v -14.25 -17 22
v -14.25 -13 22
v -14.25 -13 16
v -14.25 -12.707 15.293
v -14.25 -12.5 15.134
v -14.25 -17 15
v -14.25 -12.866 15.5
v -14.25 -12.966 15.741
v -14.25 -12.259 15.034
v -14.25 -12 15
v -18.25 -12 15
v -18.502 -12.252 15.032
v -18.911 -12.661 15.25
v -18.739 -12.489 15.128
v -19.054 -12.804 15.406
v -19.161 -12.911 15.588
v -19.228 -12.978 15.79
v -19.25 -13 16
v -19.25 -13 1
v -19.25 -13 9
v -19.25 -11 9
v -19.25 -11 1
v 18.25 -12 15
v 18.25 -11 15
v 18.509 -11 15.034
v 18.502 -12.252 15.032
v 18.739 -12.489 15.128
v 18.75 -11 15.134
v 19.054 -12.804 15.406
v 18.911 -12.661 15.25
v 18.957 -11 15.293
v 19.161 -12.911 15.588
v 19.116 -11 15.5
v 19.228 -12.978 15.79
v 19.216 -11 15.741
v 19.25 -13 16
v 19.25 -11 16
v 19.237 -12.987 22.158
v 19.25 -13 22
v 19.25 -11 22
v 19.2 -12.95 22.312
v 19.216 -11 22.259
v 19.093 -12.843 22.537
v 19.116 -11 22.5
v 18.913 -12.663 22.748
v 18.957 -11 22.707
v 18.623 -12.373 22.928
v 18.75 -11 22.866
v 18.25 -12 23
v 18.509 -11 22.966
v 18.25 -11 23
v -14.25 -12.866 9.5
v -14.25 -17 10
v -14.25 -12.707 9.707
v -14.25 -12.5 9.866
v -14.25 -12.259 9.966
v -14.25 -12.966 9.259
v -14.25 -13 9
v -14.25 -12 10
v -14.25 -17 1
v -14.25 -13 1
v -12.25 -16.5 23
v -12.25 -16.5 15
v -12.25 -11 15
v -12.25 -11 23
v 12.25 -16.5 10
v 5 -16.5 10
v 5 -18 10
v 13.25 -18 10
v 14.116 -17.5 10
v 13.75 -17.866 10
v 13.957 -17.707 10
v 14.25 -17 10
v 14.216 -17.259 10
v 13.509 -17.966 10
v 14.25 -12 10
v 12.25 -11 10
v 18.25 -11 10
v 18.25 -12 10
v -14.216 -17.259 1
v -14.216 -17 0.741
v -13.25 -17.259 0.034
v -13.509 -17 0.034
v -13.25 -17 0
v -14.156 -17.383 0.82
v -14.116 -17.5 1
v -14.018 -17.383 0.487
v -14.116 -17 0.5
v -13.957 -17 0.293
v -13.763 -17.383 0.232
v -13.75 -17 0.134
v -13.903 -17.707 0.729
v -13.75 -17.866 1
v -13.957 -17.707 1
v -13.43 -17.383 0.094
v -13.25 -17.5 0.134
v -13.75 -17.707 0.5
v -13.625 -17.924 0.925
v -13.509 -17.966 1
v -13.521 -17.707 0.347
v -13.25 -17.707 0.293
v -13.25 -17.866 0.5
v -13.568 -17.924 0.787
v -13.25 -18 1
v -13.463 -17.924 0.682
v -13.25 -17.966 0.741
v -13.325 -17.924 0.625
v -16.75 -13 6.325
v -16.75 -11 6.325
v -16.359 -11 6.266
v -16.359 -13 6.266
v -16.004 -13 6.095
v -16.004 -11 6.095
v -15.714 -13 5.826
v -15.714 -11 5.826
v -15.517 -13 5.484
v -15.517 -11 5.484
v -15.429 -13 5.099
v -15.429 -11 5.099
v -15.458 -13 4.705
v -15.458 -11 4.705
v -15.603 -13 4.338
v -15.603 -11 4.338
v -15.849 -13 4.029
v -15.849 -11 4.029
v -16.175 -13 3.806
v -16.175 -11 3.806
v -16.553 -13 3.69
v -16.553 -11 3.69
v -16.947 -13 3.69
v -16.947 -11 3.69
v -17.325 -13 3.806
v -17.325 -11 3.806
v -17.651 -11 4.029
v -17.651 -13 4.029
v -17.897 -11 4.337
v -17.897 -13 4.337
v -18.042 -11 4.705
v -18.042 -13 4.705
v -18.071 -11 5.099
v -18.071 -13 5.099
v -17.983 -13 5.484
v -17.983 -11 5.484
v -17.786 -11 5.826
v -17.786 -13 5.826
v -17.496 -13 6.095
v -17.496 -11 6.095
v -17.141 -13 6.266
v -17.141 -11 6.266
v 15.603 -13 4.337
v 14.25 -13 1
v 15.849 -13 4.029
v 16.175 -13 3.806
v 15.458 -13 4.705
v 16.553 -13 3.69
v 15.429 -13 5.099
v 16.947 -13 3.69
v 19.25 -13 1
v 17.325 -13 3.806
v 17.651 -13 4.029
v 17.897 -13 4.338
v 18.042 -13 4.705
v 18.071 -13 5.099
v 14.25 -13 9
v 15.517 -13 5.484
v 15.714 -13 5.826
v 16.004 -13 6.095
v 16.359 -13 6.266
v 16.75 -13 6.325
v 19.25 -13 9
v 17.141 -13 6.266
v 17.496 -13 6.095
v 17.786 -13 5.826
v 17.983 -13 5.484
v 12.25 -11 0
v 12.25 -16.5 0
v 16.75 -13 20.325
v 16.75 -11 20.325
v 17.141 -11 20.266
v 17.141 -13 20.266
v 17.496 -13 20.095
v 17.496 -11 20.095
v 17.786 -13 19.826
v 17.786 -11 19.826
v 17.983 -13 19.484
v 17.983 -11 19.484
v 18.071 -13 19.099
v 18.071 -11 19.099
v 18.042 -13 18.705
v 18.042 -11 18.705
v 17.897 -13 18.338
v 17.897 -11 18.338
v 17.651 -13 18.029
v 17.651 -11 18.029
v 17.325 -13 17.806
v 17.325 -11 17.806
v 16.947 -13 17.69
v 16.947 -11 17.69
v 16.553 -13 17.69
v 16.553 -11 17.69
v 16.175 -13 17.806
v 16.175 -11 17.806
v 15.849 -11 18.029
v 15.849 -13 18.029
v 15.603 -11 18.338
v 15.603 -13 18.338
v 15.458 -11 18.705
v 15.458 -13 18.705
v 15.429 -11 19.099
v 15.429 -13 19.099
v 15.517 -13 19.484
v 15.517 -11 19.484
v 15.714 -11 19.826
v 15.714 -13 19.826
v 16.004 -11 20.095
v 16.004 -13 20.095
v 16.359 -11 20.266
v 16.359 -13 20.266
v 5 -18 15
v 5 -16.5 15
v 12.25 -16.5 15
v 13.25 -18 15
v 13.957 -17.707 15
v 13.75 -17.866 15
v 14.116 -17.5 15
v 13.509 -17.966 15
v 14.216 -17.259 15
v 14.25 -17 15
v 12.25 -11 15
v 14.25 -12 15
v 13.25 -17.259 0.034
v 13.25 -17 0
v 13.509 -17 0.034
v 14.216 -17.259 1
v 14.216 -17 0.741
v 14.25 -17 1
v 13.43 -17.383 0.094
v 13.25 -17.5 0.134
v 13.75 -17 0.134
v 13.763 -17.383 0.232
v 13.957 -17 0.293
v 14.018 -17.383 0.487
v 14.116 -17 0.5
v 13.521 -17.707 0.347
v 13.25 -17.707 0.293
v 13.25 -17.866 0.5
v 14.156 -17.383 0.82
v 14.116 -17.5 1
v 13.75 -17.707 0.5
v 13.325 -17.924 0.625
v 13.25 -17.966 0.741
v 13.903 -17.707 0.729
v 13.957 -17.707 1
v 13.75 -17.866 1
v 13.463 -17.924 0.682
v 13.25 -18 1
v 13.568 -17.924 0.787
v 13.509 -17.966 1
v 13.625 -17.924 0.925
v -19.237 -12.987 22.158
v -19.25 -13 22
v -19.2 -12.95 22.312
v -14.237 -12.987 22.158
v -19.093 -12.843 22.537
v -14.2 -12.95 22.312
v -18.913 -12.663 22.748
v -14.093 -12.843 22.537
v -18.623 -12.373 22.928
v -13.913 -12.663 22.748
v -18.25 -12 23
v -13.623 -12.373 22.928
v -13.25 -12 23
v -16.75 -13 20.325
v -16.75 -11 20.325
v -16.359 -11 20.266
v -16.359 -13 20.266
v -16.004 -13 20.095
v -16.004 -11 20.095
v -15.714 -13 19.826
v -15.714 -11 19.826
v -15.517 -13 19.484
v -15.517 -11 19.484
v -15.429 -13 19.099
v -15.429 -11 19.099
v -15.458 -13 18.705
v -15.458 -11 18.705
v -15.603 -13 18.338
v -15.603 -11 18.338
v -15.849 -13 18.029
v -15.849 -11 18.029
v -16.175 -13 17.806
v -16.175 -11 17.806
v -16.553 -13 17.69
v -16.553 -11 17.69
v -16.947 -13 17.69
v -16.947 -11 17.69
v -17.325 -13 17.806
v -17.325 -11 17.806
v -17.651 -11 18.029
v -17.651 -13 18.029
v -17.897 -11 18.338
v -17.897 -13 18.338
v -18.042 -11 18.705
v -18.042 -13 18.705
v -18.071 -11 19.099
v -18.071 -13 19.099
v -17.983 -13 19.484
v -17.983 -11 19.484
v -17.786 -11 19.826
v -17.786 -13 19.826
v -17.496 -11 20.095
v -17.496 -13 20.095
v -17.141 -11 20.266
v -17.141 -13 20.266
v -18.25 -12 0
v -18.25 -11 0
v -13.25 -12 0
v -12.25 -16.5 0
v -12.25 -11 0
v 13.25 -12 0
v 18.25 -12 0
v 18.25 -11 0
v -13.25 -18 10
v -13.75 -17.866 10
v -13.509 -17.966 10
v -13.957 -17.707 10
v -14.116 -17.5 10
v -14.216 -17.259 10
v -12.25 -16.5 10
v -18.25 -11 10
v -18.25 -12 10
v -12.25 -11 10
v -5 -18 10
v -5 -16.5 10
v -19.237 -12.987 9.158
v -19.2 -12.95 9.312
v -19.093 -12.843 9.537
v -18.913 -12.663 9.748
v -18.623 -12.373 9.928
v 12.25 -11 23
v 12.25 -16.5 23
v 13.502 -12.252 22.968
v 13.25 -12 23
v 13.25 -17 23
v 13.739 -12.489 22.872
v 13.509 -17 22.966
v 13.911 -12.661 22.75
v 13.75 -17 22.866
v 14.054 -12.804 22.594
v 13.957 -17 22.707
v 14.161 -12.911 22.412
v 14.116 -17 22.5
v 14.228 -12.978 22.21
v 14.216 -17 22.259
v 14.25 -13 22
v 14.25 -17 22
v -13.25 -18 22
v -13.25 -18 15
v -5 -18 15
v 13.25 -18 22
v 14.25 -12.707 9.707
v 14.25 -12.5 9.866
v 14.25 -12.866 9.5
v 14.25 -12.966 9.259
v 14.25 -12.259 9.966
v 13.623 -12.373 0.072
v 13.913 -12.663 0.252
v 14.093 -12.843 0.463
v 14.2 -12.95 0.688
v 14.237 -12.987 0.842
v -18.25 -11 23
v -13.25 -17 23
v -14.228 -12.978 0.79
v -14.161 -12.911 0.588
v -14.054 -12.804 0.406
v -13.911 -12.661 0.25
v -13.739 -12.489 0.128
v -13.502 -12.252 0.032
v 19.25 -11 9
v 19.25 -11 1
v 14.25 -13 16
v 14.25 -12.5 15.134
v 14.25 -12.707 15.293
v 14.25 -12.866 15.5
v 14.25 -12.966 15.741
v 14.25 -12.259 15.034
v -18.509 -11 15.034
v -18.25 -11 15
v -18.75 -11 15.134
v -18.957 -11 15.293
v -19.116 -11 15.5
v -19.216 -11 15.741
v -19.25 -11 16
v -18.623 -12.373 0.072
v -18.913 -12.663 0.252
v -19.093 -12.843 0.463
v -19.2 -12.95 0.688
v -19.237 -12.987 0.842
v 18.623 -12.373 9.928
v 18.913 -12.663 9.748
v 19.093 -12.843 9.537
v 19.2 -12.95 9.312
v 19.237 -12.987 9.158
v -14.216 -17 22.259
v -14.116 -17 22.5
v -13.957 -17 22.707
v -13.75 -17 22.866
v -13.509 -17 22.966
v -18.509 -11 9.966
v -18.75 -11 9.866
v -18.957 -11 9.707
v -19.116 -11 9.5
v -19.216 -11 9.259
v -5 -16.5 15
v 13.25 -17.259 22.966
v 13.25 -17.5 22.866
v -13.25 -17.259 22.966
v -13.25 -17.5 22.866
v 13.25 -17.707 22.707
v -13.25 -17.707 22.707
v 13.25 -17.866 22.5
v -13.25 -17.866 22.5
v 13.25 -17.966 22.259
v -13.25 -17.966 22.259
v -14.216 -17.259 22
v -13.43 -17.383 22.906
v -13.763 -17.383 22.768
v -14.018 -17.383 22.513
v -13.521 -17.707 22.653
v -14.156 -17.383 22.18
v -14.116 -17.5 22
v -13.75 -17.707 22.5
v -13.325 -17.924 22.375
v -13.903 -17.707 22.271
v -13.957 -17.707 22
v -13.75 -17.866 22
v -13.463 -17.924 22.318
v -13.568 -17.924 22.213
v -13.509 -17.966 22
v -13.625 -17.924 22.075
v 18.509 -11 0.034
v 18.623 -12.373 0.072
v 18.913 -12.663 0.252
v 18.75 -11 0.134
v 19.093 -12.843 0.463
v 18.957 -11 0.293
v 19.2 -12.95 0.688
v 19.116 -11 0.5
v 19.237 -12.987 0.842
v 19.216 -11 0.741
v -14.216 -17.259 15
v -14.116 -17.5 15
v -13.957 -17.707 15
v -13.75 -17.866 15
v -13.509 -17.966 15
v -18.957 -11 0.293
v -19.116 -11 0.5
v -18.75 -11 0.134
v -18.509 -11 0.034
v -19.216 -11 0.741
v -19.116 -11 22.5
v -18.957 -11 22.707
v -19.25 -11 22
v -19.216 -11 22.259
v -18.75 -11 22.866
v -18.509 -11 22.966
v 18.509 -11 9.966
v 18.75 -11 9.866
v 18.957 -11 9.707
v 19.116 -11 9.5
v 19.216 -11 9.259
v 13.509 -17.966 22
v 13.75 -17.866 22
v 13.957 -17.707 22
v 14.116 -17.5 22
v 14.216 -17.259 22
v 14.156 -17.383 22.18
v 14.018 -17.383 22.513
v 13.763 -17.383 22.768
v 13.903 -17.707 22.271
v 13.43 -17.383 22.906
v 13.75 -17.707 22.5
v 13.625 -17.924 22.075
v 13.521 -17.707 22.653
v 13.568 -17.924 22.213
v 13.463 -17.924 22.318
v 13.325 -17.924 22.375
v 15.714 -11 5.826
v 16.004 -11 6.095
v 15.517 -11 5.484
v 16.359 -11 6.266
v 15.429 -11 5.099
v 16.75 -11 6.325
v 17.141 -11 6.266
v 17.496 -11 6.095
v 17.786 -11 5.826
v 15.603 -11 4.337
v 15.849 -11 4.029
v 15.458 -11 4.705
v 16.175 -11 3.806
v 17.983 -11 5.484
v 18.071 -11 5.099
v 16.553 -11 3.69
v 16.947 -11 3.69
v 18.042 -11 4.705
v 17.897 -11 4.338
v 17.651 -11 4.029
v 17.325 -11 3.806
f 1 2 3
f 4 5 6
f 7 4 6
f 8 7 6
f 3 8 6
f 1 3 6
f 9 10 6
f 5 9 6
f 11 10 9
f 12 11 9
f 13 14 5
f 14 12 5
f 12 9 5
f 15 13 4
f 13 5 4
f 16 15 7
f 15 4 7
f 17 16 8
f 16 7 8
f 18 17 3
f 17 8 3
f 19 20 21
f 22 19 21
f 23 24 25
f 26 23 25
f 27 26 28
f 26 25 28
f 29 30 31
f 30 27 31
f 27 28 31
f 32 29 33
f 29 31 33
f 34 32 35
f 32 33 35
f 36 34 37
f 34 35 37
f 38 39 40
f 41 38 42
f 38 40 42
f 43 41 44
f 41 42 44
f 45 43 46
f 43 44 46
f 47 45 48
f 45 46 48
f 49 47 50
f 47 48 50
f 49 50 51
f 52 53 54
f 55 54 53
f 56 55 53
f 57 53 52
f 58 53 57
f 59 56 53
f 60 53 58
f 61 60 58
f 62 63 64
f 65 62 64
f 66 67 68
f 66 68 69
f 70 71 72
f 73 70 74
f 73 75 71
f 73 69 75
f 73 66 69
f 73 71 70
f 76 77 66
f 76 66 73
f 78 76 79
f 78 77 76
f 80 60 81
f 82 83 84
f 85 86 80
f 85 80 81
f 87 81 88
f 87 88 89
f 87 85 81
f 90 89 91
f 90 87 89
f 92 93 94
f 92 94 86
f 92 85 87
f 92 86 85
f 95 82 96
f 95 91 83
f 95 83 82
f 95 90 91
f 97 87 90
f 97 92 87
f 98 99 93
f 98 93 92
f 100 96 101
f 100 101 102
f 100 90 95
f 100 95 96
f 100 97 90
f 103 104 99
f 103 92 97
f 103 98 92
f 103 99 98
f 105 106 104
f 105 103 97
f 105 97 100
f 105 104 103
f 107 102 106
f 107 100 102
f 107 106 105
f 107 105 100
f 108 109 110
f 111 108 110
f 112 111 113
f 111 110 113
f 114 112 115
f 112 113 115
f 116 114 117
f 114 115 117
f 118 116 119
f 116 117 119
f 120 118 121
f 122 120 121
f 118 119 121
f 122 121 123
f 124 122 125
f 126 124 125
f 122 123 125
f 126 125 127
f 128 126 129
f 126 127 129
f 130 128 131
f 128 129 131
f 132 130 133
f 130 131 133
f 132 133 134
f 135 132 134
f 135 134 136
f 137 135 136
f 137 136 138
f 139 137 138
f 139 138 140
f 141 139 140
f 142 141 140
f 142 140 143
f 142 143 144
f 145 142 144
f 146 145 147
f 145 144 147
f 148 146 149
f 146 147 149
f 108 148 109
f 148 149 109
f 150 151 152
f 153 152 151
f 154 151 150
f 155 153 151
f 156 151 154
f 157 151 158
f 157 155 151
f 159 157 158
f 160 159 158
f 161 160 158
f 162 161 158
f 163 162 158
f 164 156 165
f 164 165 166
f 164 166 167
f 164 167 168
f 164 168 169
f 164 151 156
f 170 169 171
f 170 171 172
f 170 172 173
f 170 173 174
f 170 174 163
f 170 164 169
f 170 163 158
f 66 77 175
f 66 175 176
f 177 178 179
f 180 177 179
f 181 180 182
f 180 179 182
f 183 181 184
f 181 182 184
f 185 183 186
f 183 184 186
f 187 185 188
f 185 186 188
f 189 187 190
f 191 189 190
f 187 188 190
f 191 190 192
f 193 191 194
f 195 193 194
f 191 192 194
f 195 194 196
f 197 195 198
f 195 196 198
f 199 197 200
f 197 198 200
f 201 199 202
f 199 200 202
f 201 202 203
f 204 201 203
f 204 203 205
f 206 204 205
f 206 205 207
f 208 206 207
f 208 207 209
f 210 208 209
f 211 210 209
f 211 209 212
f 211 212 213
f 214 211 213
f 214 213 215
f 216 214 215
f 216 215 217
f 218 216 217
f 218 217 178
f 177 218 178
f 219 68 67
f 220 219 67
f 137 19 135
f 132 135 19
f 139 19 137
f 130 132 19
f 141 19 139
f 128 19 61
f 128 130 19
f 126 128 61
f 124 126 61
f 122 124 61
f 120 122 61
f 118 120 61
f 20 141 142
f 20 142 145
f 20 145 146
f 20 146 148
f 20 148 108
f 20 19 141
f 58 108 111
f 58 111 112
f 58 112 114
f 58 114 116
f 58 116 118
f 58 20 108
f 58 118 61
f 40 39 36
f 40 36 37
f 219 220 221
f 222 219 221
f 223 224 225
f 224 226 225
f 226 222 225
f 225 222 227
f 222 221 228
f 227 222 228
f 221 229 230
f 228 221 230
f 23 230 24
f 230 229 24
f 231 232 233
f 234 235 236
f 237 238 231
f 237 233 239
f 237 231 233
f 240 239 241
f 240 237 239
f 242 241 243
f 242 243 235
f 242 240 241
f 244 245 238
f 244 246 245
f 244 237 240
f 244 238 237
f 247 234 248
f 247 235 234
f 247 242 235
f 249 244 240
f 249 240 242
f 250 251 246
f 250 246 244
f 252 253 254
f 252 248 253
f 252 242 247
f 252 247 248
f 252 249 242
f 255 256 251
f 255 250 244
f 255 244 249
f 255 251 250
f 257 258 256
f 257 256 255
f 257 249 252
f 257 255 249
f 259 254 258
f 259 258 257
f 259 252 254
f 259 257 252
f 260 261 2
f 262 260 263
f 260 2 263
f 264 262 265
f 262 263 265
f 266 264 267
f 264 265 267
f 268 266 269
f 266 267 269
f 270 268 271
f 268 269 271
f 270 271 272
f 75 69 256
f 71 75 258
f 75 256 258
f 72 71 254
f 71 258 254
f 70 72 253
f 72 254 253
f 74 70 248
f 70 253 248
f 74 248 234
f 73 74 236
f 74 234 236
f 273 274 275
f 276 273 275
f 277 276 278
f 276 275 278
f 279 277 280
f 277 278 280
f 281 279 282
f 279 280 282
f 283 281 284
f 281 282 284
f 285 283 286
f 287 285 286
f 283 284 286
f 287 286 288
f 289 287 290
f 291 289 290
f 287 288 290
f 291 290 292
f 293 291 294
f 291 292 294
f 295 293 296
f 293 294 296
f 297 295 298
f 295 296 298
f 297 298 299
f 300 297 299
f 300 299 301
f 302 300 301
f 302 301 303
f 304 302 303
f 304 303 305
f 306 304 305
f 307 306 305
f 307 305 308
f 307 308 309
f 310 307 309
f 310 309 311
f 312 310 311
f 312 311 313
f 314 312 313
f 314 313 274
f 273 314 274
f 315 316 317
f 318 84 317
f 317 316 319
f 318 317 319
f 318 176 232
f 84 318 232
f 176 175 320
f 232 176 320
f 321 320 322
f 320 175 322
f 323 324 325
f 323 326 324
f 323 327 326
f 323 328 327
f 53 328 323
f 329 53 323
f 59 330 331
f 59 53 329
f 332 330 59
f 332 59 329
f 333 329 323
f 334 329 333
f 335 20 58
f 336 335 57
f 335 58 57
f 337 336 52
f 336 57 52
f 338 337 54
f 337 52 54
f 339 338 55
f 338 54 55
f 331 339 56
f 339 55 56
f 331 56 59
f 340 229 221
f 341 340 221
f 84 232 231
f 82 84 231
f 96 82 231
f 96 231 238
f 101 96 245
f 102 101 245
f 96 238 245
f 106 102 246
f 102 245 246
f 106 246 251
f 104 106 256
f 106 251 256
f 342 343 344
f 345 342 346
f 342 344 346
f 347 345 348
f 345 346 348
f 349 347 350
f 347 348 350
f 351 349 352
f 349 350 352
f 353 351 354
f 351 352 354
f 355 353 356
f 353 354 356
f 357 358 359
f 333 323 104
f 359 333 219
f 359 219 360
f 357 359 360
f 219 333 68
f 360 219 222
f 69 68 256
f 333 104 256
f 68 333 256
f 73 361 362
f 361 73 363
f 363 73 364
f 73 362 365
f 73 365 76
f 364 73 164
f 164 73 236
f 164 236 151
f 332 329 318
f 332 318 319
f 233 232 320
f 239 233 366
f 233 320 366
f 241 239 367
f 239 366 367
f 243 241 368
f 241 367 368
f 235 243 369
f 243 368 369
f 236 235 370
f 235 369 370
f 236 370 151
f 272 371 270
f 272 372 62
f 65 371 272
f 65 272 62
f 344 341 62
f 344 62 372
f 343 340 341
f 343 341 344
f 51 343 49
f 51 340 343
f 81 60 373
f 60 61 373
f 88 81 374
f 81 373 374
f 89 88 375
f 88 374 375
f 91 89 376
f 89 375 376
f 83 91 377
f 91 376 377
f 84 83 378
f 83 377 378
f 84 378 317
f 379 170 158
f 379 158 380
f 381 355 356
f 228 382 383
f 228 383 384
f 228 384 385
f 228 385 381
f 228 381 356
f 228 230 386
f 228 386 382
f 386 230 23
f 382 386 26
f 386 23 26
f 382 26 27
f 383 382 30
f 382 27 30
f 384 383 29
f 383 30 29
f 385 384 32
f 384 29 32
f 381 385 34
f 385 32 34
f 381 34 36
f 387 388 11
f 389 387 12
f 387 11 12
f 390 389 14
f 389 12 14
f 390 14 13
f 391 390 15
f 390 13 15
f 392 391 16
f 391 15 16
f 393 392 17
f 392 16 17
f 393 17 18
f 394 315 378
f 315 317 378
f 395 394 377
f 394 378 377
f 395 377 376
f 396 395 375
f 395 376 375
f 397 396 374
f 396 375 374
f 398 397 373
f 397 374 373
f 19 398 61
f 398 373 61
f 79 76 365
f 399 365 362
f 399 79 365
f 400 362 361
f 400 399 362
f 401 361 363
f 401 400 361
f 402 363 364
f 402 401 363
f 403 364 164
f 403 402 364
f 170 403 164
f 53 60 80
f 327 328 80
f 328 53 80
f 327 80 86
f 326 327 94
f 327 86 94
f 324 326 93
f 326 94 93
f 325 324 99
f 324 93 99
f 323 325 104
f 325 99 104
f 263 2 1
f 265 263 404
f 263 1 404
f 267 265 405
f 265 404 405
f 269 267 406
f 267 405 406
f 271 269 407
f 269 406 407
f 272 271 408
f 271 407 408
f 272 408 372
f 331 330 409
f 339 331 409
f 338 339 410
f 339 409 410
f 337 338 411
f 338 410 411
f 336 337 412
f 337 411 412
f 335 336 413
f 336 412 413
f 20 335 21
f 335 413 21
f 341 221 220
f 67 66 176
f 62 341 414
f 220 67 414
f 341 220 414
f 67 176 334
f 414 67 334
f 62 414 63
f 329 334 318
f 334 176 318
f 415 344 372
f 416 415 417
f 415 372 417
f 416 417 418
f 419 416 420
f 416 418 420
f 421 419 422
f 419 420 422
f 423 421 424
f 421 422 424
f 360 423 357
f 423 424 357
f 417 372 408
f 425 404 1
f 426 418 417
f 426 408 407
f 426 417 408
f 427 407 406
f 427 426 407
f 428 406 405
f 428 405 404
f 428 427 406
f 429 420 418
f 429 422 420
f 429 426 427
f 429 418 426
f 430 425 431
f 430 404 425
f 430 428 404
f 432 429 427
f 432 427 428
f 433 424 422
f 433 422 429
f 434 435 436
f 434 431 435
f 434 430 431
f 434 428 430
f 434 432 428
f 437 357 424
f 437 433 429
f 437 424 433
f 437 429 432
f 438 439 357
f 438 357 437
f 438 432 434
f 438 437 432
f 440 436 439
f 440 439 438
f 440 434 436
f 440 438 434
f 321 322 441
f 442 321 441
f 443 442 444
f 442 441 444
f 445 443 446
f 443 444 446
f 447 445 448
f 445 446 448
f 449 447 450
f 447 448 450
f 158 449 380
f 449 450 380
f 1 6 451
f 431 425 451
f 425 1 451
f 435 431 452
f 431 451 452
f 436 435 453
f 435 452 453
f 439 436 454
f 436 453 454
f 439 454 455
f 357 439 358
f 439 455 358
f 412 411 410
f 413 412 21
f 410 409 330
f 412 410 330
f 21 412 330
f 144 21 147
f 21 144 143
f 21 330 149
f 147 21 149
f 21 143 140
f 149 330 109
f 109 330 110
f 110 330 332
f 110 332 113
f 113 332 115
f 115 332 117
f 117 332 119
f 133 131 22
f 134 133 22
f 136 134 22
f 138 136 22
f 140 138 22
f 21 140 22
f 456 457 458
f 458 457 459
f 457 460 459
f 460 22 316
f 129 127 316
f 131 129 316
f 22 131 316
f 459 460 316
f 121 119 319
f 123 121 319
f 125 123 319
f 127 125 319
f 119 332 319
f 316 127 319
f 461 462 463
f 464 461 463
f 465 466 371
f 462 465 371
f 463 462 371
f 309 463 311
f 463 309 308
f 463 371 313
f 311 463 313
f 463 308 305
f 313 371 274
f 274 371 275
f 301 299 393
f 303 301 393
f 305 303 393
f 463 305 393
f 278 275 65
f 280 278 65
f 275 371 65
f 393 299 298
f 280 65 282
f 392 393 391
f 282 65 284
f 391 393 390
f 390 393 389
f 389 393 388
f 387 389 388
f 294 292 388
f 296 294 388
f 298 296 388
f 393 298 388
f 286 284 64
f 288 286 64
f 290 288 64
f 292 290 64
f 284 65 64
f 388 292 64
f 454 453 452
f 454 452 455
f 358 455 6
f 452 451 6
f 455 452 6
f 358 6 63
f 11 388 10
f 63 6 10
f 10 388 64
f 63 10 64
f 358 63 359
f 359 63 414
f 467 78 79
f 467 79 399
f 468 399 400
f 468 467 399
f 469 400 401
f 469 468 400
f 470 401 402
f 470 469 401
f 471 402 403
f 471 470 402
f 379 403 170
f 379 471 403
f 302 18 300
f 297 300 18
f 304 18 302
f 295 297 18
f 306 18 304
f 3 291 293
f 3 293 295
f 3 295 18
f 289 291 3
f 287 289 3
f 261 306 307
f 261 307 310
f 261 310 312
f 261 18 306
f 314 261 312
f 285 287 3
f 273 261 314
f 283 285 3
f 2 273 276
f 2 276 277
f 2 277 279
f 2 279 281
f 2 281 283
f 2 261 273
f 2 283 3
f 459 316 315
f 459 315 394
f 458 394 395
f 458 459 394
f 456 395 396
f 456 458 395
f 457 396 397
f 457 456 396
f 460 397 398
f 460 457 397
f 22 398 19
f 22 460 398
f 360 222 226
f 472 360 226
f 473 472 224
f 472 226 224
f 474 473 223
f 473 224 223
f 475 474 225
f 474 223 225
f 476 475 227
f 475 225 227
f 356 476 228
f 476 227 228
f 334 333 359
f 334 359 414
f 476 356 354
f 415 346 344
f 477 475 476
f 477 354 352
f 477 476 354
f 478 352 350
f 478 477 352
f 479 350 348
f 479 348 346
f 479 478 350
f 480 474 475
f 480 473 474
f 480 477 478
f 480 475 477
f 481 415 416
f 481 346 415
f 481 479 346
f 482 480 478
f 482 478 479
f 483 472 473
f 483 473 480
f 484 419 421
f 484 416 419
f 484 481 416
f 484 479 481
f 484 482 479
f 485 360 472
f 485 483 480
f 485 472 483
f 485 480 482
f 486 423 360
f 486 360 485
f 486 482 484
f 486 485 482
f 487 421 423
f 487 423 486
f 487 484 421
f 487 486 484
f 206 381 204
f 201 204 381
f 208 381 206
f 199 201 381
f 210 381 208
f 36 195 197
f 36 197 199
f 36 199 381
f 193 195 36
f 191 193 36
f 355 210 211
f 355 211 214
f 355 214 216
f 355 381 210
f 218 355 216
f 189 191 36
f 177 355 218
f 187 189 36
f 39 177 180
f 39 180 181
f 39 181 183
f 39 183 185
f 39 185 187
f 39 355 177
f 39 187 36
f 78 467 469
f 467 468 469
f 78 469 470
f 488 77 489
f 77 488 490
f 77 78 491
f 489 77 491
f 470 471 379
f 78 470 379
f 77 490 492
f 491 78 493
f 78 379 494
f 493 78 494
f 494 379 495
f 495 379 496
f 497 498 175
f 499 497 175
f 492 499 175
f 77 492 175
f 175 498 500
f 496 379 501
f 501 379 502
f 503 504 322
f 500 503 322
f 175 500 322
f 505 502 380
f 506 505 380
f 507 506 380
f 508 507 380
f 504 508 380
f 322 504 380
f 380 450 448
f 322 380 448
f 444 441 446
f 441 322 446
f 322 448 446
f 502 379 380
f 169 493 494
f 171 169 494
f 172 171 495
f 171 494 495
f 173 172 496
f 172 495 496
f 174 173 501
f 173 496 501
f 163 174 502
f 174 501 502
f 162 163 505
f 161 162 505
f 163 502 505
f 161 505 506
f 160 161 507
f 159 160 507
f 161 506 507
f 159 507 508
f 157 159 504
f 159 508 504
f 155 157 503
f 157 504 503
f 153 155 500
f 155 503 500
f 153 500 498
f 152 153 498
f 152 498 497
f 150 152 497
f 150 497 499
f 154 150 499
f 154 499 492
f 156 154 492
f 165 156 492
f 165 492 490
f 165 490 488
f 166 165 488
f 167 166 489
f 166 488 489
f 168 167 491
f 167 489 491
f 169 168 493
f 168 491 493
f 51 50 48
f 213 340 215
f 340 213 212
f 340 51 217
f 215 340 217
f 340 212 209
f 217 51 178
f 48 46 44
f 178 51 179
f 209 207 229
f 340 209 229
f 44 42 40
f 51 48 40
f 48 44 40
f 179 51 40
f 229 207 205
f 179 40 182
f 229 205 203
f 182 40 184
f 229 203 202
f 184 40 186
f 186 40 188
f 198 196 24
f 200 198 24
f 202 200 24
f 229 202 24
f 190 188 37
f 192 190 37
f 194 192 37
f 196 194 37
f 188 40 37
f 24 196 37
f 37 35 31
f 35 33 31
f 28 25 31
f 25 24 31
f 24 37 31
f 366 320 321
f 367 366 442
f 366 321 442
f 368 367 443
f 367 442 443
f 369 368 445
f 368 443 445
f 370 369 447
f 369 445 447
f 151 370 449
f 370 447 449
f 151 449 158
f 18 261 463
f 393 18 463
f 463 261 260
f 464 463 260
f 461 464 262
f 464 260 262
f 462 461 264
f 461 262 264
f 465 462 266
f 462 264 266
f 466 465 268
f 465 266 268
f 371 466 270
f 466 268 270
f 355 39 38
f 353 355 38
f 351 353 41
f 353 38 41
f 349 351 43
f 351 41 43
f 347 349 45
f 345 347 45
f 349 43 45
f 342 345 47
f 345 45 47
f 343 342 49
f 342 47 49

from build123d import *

# Parameters (mm, degrees)
SKETCH1_W           = 28.5
SKETCH1_H           = 36
SKETCH1_W_2         = 24.5
SKETCH1_H_2         = 33
BOSS_EXTRUDE1_DEPTH = 10
SKETCH2_W           = 5
SKETCH2_H           = 4
BOSS_EXTRUDE2_DEPTH = 10
SKETCH3_R           = 1.325
CUT_EXTRUDE1_DEPTH  = 10
FILLET1_R           = 1
FILLET2_R           = 1
CUT_EXTRUDE2_DEPTH  = 40.322385482
SKETCH5_W           = 15
SKETCH5_H           = 1.5
SKETCH5_W_2         = 2
SKETCH5_H_2         = 10
BOSS_EXTRUDE3_DEPTH = 5
SKETCH6_W           = 10
SKETCH6_H           = 1.5
BOSS_EXTRUDE4_DEPTH = 5
BOSS_EXTRUDE5_DEPTH = 8
SKETCH8_W           = 7
SKETCH8_H           = 3
CUT_EXTRUDE3_DEPTH  = 5
SKETCH9_W           = 5
SKETCH9_H           = 2.1
CUT_EXTRUDE4_DEPTH  = 5
SKETCH10_W          = 10
SKETCH10_H          = 1.5
BOSS_EXTRUDE6_DEPTH = 8
SKETCH11_W          = 5
SKETCH11_H          = 4
BOSS_EXTRUDE7_DEPTH = 8
SKETCH12_R          = 1.325
CUT_EXTRUDE5_DEPTH  = 42.37405588
CUT_EXTRUDE6_DEPTH  = 46.072164359
FILLET3_R           = 1


with BuildPart() as part:
    # Sketch1 → Boss-Extrude1 (new body)
    with BuildSketch(Plane.XY):
        Rectangle(SKETCH1_W, SKETCH1_H)
        Rectangle(SKETCH1_W_2, SKETCH1_H_2, mode=Mode.SUBTRACT)
    extrude(amount=BOSS_EXTRUDE1_DEPTH)

    # Sketch2 → Boss-Extrude2 (add)
    with BuildSketch(Plane.XY.offset(10)):
        with Locations((-16.75, -11)):
            Rectangle(SKETCH2_W, SKETCH2_H)
        with Locations((16.75, -11)):
            Rectangle(SKETCH2_W, SKETCH2_H)
    extrude(amount=-BOSS_EXTRUDE2_DEPTH)

    # Sketch3 → Cut-Extrude1 (cut)
    with BuildSketch(Plane(origin=(0, -9, 0), x_dir=(1, 0, 0), z_dir=(0, 1, 0))):
        with Locations(Location((-16.75, -5, 0), (0, 0, 270))):
            Circle(SKETCH3_R)
        with Locations(Location((16.75, -5, 0), (0, 0, 270))):
            Circle(SKETCH3_R)
    extrude(amount=-CUT_EXTRUDE1_DEPTH, mode=Mode.SUBTRACT)


with BuildPart() as body_2:
    # Split1: the piece on the far side of the plane
    add(part.part)
    split(bisect_by=Plane(origin=(0, -11, 0), x_dir=(0, 0, -1), z_dir=(0, -1, 0)), keep=Keep.BOTTOM)

    # Fillet1
    fillet1_edges = [body_2.edges().sort_by_distance(p)[0] for p in [
        (-16.75, -9, 10),
        (-19.25, -10, 10),
        (-19.25, -10, 0),
        (-16.75, -9, 0),
        (14.25, 4.5, 0),
        (0, 18, 0),
        (-14.25, 4.5, 0),
        (16.75, -9, 0),
        (19.25, -10, 10),
        (19.25, -10, 0),
        (16.75, -9, 10),
    ]]
    fillet(fillet1_edges, radius=FILLET1_R)

    # Sketch4 → Cut-Extrude2 (cut, through all)
    with BuildSketch(Plane.ZY.offset(14.25)):
        with BuildLine():
            Line((7, 12.5), (7, -3.5))
            ThreePointArc((7, -3.5), (5, -5.5), (3, -3.5))
            Line((3, -3.5), (3, 12.5))
            ThreePointArc((3, 12.5), (5, 14.5), (7, 12.5))
        make_face()
    extrude(amount=-CUT_EXTRUDE2_DEPTH, mode=Mode.SUBTRACT)

    # Sketch5 → Boss-Extrude3 (add)
    with BuildSketch(Plane.XY.offset(10)):
        with Locations((0, 17.25)):
            Rectangle(SKETCH5_W, SKETCH5_H)
        with Locations((-13.25, 4)):
            Rectangle(SKETCH5_W_2, SKETCH5_H_2)
        with Locations((13.25, 4)):
            Rectangle(SKETCH5_W_2, SKETCH5_H_2)
    extrude(amount=BOSS_EXTRUDE3_DEPTH)



with BuildPart() as part_1:
    add(part.part)

    # Split1
    split(bisect_by=Plane(origin=(0, -11, 0), x_dir=(0, 0, -1), z_dir=(0, -1, 0)), keep=Keep.TOP)

    # Fillet2
    fillet2_edges = [part_1.edges().sort_by_distance(p)[0] for p in [
        (-14.25, -15.5, 0),
        (-16.75, -13, 0),
        (-19.25, -12, 10),
        (-16.75, -13, 10),
        (-19.25, -12, 0),
        (16.75, -13, 10),
        (19.25, -12, 10),
        (19.25, -12, 0),
        (16.75, -13, 0),
        (0, -18, 0),
        (14.25, -15.5, 0),
    ]]
    fillet(fillet2_edges, radius=FILLET2_R)

    # Sketch6 → Boss-Extrude4 (add)
    with BuildSketch(Plane.XY.offset(10)):
        with Locations((0, -17.25)):
            Rectangle(SKETCH6_W, SKETCH6_H)
    extrude(amount=BOSS_EXTRUDE4_DEPTH)


with BuildPart() as body_2_1:
    add(body_2.part)

    add(part_1.part)  # Boss-Extrude5 merges part
    # Sketch7 → Boss-Extrude5 (add)
    with BuildSketch(Plane.XY.offset(15)):
        Polygon((14.25, 9), (14.25, 18), (14.25, 19.5), (-14.25, 19.5), (-14.25, 18), (-14.25, 9), (-14.25, -1), (-14.25, -10), (-14.25, -11), (-12.25, -11), (-12.25, -1), (-12.25, 9), (-12.25, 16.5), (-7.5, 16.5), (7.5, 16.5), (12.25, 16.5), (12.25, 9), (12.25, -1), (12.25, -11), (14.25, -11), (14.25, -10), (14.25, -1), align=None)
    extrude(amount=BOSS_EXTRUDE5_DEPTH)

    # Sketch8 → Cut-Extrude3 (cut)
    with BuildSketch(Plane.XY.offset(23)):
        with Locations((0, 16.5)):
            Rectangle(SKETCH8_W, SKETCH8_H)
    extrude(amount=-CUT_EXTRUDE3_DEPTH, mode=Mode.SUBTRACT)

    # Sketch9 → Cut-Extrude4 (cut)
    with BuildSketch(Plane.XY.offset(23)):
        with Locations((6, 17.55)):
            Rectangle(SKETCH9_W, SKETCH9_H)
        with Locations((-6, 17.55)):
            Rectangle(SKETCH9_W, SKETCH9_H)
    extrude(amount=-CUT_EXTRUDE4_DEPTH, mode=Mode.SUBTRACT)

    # Sketch10 → Boss-Extrude6 (add)
    with BuildSketch(Plane.XY.offset(15)):
        Polygon((-5, -18), (-5, -16.5), (-12.25, -16.5), (-12.25, -11), (-14.25, -11), (-14.25, -12), (-14.25, -18), align=None)
        with Locations((0, -17.25)):
            Rectangle(SKETCH10_W, SKETCH10_H)
        Polygon((12.25, -11), (12.25, -16.5), (5, -16.5), (5, -18), (14.25, -18), (14.25, -12), (14.25, -11), align=None)
    extrude(amount=BOSS_EXTRUDE6_DEPTH)

    # Sketch11 → Boss-Extrude7 (add)
    with BuildSketch(Plane.XY.offset(23)):
        with Locations((-16.75, -11)):
            Rectangle(SKETCH11_W, SKETCH11_H)
        with Locations((16.75, -11)):
            Rectangle(SKETCH11_W, SKETCH11_H)
    extrude(amount=-BOSS_EXTRUDE7_DEPTH)

    # Sketch12 → Cut-Extrude5 (cut, through all)
    with BuildSketch(Plane(origin=(0, -9, 0), x_dir=(1, 0, 0), z_dir=(0, 1, 0))):
        with Locations(Location((-16.75, -19, 0), (0, 0, 270))):
            Circle(SKETCH12_R)
        with Locations(Location((16.75, -19, 0), (0, 0, 270))):
            Circle(SKETCH12_R)
    extrude(amount=-CUT_EXTRUDE5_DEPTH, mode=Mode.SUBTRACT)

    # Sketch13 → Cut-Extrude6 (cut, through all)
    with BuildSketch(Plane.ZY.offset(14.25)):
        with BuildLine():
            Line((17, -3.5), (17, 12.5))
            ThreePointArc((17, 12.5), (19, 14.5), (21, 12.5))
            Line((21, 12.5), (21, -3.5))
            ThreePointArc((21, -3.5), (19, -5.5), (17, -3.5))
        make_face()
    extrude(amount=-CUT_EXTRUDE6_DEPTH, mode=Mode.SUBTRACT)

    # Fillet3
    # the kernel refuses this fillet: 1 mm, written as the material it takes off along each edge
    with BuildSketch(Plane(origin=(13.25, -17, 1), x_dir=(1, 0, 0), z_dir=(0, -1, 0))) as fillet3_piece_1_section:
        Polygon((0, 0), (FILLET3_R, 0), (FILLET3_R, -FILLET3_R), (0, -FILLET3_R), align=None)
    fillet3_piece_1 = extrude(amount=FILLET3_R, mode=Mode.PRIVATE)
    fillet3_piece_1 = fillet3_piece_1 - Plane(origin=(13.25, -17, 1), x_dir=(-0.7071067811865475, 0, 0.7071067811865475), z_dir=(0, -1, 0)) * Sphere(FILLET3_R, mode=Mode.PRIVATE)
    add(fillet3_piece_1, mode=Mode.SUBTRACT)
    with BuildSketch(Plane(origin=(-13.25, -17, 1), x_dir=(-1, 0, 0), z_dir=(0, -1, 0))) as fillet3_piece_2_section:
        Polygon((0, 0), (FILLET3_R, 0), (FILLET3_R, FILLET3_R), (0, FILLET3_R), align=None)
    fillet3_piece_2 = extrude(amount=FILLET3_R, mode=Mode.PRIVATE)
    fillet3_piece_2 = fillet3_piece_2 - Plane(origin=(-13.25, -17, 1), x_dir=(0.7071067811865475, 0, 0.7071067811865475), z_dir=(0, -1, 0)) * Sphere(FILLET3_R, mode=Mode.PRIVATE)
    add(fillet3_piece_2, mode=Mode.SUBTRACT)
    with BuildSketch(Plane(origin=(13.25, 17, 1), x_dir=(0, 1, 0), z_dir=(1, 0, 0))) as fillet3_piece_3_section:
        Polygon((0, 0), (FILLET3_R, 0), (FILLET3_R, -FILLET3_R), (0, -FILLET3_R), align=None)
    fillet3_piece_3 = extrude(amount=FILLET3_R, mode=Mode.PRIVATE)
    fillet3_piece_3 = fillet3_piece_3 - Plane(origin=(13.25, 17, 1), x_dir=(0, -0.7071067811865475, 0.7071067811865475), z_dir=(1, 0, 0)) * Sphere(FILLET3_R, mode=Mode.PRIVATE)
    add(fillet3_piece_3, mode=Mode.SUBTRACT)
    with BuildSketch(Plane(origin=(-13.25, 17, 1), x_dir=(0, 1, 0), z_dir=(-1, 0, 0))) as fillet3_piece_4_section:
        Polygon((0, 0), (FILLET3_R, 0), (FILLET3_R, FILLET3_R), (0, FILLET3_R), align=None)
    fillet3_piece_4 = extrude(amount=FILLET3_R, mode=Mode.PRIVATE)
    fillet3_piece_4 = fillet3_piece_4 - Plane(origin=(-13.25, 17, 1), x_dir=(0, -0.7071067811865475, 0.7071067811865475), z_dir=(-1, 0, 0)) * Sphere(FILLET3_R, mode=Mode.PRIVATE)
    add(fillet3_piece_4, mode=Mode.SUBTRACT)
    with BuildSketch(Plane(origin=(13.25, -17, 22), x_dir=(0, 0, 1), z_dir=(0, -1, 0))) as fillet3_piece_5_section:
        Polygon((0, 0), (FILLET3_R, 0), (FILLET3_R, -FILLET3_R), (0, -FILLET3_R), align=None)
    fillet3_piece_5 = extrude(amount=FILLET3_R, mode=Mode.PRIVATE)
    fillet3_piece_5 = fillet3_piece_5 - Plane(origin=(13.25, -17, 22), x_dir=(-0.7071067811865475, 0, -0.7071067811865475), z_dir=(0, -1, 0)) * Sphere(FILLET3_R, mode=Mode.PRIVATE)
    add(fillet3_piece_5, mode=Mode.SUBTRACT)
    with BuildSketch(Plane(origin=(-13.25, -17, 22), x_dir=(-1, 0, 0), z_dir=(0, -1, 0))) as fillet3_piece_6_section:
        Polygon((0, 0), (FILLET3_R, 0), (FILLET3_R, -FILLET3_R), (0, -FILLET3_R), align=None)
    fillet3_piece_6 = extrude(amount=FILLET3_R, mode=Mode.PRIVATE)
    fillet3_piece_6 = fillet3_piece_6 - Plane(origin=(-13.25, -17, 22), x_dir=(0.7071067811865475, 0, -0.7071067811865475), z_dir=(0, -1, 0)) * Sphere(FILLET3_R, mode=Mode.PRIVATE)
    add(fillet3_piece_6, mode=Mode.SUBTRACT)
    with BuildSketch(Plane(origin=(-14.25, 18, 1), x_dir=(0, -1, 0), z_dir=(0, 0, 1)), Plane(origin=(-14.25, -18, 1), x_dir=(1, 0, 0), z_dir=(0, 0, 1))) as fillet3_piece_7:
        with BuildLine():
            CenterArc((FILLET3_R, FILLET3_R), FILLET3_R, 180, 90)
            Line((0, FILLET3_R), (0, 0))
            Line((0, 0), (FILLET3_R, 0))
        make_face()
    extrude(amount=11.5, mode=Mode.SUBTRACT)
    with BuildSketch(Plane(origin=(14.25, 18, 1), x_dir=(0, -1, 0), z_dir=(0, 0, 1)), Plane(origin=(14.25, -18, 1), x_dir=(-1, 0, 0), z_dir=(0, 0, 1))) as fillet3_piece_8:
        with BuildLine():
            CenterArc((FILLET3_R, -FILLET3_R), FILLET3_R, 90, 90)
            Line((0, -FILLET3_R), (0, 0))
            Line((0, 0), (FILLET3_R, 0))
        make_face()
    extrude(amount=11.5, mode=Mode.SUBTRACT)
    with BuildSketch(Plane(origin=(14.25, 19.5, 12.5), x_dir=(0, -1, 0), z_dir=(0, 0, 1))) as fillet3_piece_9:
        with BuildLine():
            CenterArc((FILLET3_R, -FILLET3_R), FILLET3_R, 90, 90)
            Line((0, -FILLET3_R), (0, 0))
            Line((0, 0), (FILLET3_R, 0))
        make_face()
    extrude(amount=13, mode=Mode.SUBTRACT)
    with BuildSketch(Plane(origin=(-14.25, 19.5, 12.5), x_dir=(0, -1, 0), z_dir=(0, 0, 1))) as fillet3_piece_10:
        with BuildLine():
            CenterArc((FILLET3_R, FILLET3_R), FILLET3_R, 180, 90)
            Line((0, FILLET3_R), (0, 0))
            Line((0, 0), (FILLET3_R, 0))
        make_face()
    extrude(amount=13, mode=Mode.SUBTRACT)
    with BuildSketch(Plane(origin=(14.25, -17, 23), x_dir=(-1, 0, 0), z_dir=(0, 1, 0)), Plane(origin=(-14.25, -17, 23), x_dir=(0, 0, -1), z_dir=(0, 1, 0))) as fillet3_piece_11:
        with BuildLine():
            CenterArc((FILLET3_R, -FILLET3_R), FILLET3_R, 90, 90)
            Line((0, -FILLET3_R), (0, 0))
            Line((0, 0), (FILLET3_R, 0))
        make_face()
    extrude(amount=4, mode=Mode.SUBTRACT)
    with BuildSketch(Plane(origin=(-14.25, -9, 23), x_dir=(1, 0, 0), z_dir=(0, 1, 0))) as fillet3_piece_12:
        with BuildLine():
            CenterArc((FILLET3_R, FILLET3_R), FILLET3_R, 180, 90)
            Line((0, FILLET3_R), (0, 0))
            Line((0, 0), (FILLET3_R, 0))
        make_face()
    extrude(amount=31, mode=Mode.SUBTRACT)
    with BuildSketch(Plane(origin=(-13.25, -18, 23), x_dir=(0, 0, -1), z_dir=(1, 0, 0))) as fillet3_piece_13:
        with BuildLine():
            CenterArc((FILLET3_R, FILLET3_R), FILLET3_R, 180, 90)
            Line((0, FILLET3_R), (0, 0))
            Line((0, 0), (FILLET3_R, 0))
        make_face()
    extrude(amount=26.5, mode=Mode.SUBTRACT)
    with BuildSketch(Plane(origin=(-14.25, -18, 12.5), x_dir=(1, 0, 0), z_dir=(0, 0, 1))) as fillet3_piece_14:
        with BuildLine():
            CenterArc((FILLET3_R, FILLET3_R), FILLET3_R, 180, 90)
            Line((0, FILLET3_R), (0, 0))
            Line((0, 0), (FILLET3_R, 0))
        make_face()
    extrude(amount=9.5, mode=Mode.SUBTRACT)
    with BuildSketch(Plane(origin=(14.25, -18, 12.5), x_dir=(-1, 0, 0), z_dir=(0, 0, 1))) as fillet3_piece_15:
        with BuildLine():
            CenterArc((FILLET3_R, -FILLET3_R), FILLET3_R, 90, 90)
            Line((0, -FILLET3_R), (0, 0))
            Line((0, 0), (FILLET3_R, 0))
        make_face()
    extrude(amount=9.5, mode=Mode.SUBTRACT)
    with BuildSketch(Plane(origin=(-21.75, -9, 23), x_dir=(0, -1, 0), z_dir=(1, 0, 0)), Plane(origin=(-14.25, -13, 23), x_dir=(0, 1, 0), z_dir=(-1, 0, 0)), Plane(origin=(14.25, -9, 23), x_dir=(0, -1, 0), z_dir=(1, 0, 0)), Plane(origin=(21.75, -13, 23), x_dir=(0, 1, 0), z_dir=(-1, 0, 0))) as fillet3_piece_16:
        with BuildLine():
            CenterArc((FILLET3_R, FILLET3_R), FILLET3_R, 180, 90)
            Line((0, FILLET3_R), (0, 0))
            Line((0, 0), (FILLET3_R, 0))
        make_face()
    extrude(amount=7.5, mode=Mode.SUBTRACT)
    with BuildSketch(Plane(origin=(-19.25, -15.5, 23), x_dir=(1, 0, 0), z_dir=(0, 1, 0)), Plane(origin=(19.25, -6.5, 23), x_dir=(-1, 0, 0), z_dir=(0, -1, 0))) as fillet3_piece_17:
        with BuildLine():
            CenterArc((FILLET3_R, FILLET3_R), FILLET3_R, 180, 90)
            Line((0, FILLET3_R), (0, 0))
            Line((0, 0), (FILLET3_R, 0))
        make_face()
    extrude(amount=9, mode=Mode.SUBTRACT)
    with BuildSketch(Plane(origin=(-21.75, -9, 15), x_dir=(0, -1, 0), z_dir=(1, 0, 0)), Plane(origin=(-14.25, -13, 15), x_dir=(0, 1, 0), z_dir=(-1, 0, 0)), Plane(origin=(14.25, -9, 15), x_dir=(0, -1, 0), z_dir=(1, 0, 0)), Plane(origin=(21.75, -13, 15), x_dir=(0, 1, 0), z_dir=(-1, 0, 0))) as fillet3_piece_18:
        with BuildLine():
            CenterArc((FILLET3_R, -FILLET3_R), FILLET3_R, 90, 90)
            Line((0, -FILLET3_R), (0, 0))
            Line((0, 0), (FILLET3_R, 0))
        make_face()
    extrude(amount=7.5, mode=Mode.SUBTRACT)
    with BuildSketch(Plane(origin=(-19.25, -15.5, 15), x_dir=(1, 0, 0), z_dir=(0, 1, 0)), Plane(origin=(19.25, -6.5, 15), x_dir=(-1, 0, 0), z_dir=(0, -1, 0))) as fillet3_piece_19:
        with BuildLine():
            CenterArc((FILLET3_R, -FILLET3_R), FILLET3_R, 90, 90)
            Line((0, -FILLET3_R), (0, 0))
            Line((0, 0), (FILLET3_R, 0))
        make_face()
    extrude(amount=9, mode=Mode.SUBTRACT)
    with BuildSketch(Plane(origin=(14.25, -9, 23), x_dir=(-1, 0, 0), z_dir=(0, 1, 0))) as fillet3_piece_20:
        with BuildLine():
            CenterArc((FILLET3_R, -FILLET3_R), FILLET3_R, 90, 90)
            Line((0, -FILLET3_R), (0, 0))
            Line((0, 0), (FILLET3_R, 0))
        make_face()
    extrude(amount=31, mode=Mode.SUBTRACT)
    with BuildSketch(Plane(origin=(14.25, -17, 23), x_dir=(-1, 0, 0), z_dir=(0, 1, 0))) as fillet3_piece_21a_section:
        with BuildLine():
            CenterArc((FILLET3_R, -FILLET3_R), FILLET3_R, 90, 90)
            Line((0, -FILLET3_R), (0, 0))
            Line((0, 0), (FILLET3_R, 0))
        make_face()
    fillet3_piece_21a = extrude(amount=6.5, mode=Mode.PRIVATE)
    fillet3_piece_21a = split(fillet3_piece_21a, bisect_by=Plane(origin=(14.023604886, -13, 22.773604886), z_dir=(0, 1, 0)), keep=Keep.TOP, mode=Mode.PRIVATE)
    with BuildSketch(Plane(origin=(21.75, -13, 23), x_dir=(0, 1, 0), z_dir=(-1, 0, 0))) as fillet3_piece_21b_section:
        with BuildLine():
            CenterArc((FILLET3_R, FILLET3_R), FILLET3_R, 180, 90)
            Line((0, FILLET3_R), (0, 0))
            Line((0, 0), (FILLET3_R, 0))
        make_face()
    fillet3_piece_21b = extrude(amount=10, mode=Mode.PRIVATE)
    fillet3_piece_21b = split(fillet3_piece_21b, bisect_by=Plane(origin=(14.25, -12.773604886, 22.773604886), z_dir=(-1, 0, 0)), keep=Keep.TOP, mode=Mode.PRIVATE)
    fillet3_piece_21 = fillet3_piece_21a & fillet3_piece_21b
    add(fillet3_piece_21, mode=Mode.SUBTRACT)
    with BuildSketch(Plane(origin=(-14.25, -11.5, 23), x_dir=(1, 0, 0), z_dir=(0, 1, 0))) as fillet3_piece_22a_section:
        with BuildLine():
            CenterArc((FILLET3_R, FILLET3_R), FILLET3_R, 180, 90)
            Line((0, FILLET3_R), (0, 0))
            Line((0, 0), (FILLET3_R, 0))
        make_face()
    fillet3_piece_22a = extrude(amount=33.5, mode=Mode.PRIVATE)
    fillet3_piece_22a = split(fillet3_piece_22a, bisect_by=Plane(origin=(-14.023604886, -9, 22.773604886), z_dir=(0, -1, 0)), keep=Keep.TOP, mode=Mode.PRIVATE)
    with BuildSketch(Plane(origin=(-21.75, -9, 23), x_dir=(0, -1, 0), z_dir=(1, 0, 0))) as fillet3_piece_22b_section:
        with BuildLine():
            CenterArc((FILLET3_R, FILLET3_R), FILLET3_R, 180, 90)
            Line((0, FILLET3_R), (0, 0))
            Line((0, 0), (FILLET3_R, 0))
        make_face()
    fillet3_piece_22b = extrude(amount=10, mode=Mode.PRIVATE)
    fillet3_piece_22b = split(fillet3_piece_22b, bisect_by=Plane(origin=(-14.25, -9.226395114, 22.773604886), z_dir=(1, 0, 0)), keep=Keep.TOP, mode=Mode.PRIVATE)
    fillet3_piece_22 = fillet3_piece_22a & fillet3_piece_22b
    add(fillet3_piece_22, mode=Mode.SUBTRACT)
    with BuildSketch(Plane(origin=(-14.25, -17, 23), x_dir=(0, 0, -1), z_dir=(0, 1, 0))) as fillet3_piece_23a_section:
        with BuildLine():
            CenterArc((FILLET3_R, -FILLET3_R), FILLET3_R, 90, 90)
            Line((0, -FILLET3_R), (0, 0))
            Line((0, 0), (FILLET3_R, 0))
        make_face()
    fillet3_piece_23a = extrude(amount=6.5, mode=Mode.PRIVATE)
    fillet3_piece_23a = split(fillet3_piece_23a, bisect_by=Plane(origin=(-14.023604886, -13, 22.773604886), z_dir=(0, 1, 0)), keep=Keep.TOP, mode=Mode.PRIVATE)
    with BuildSketch(Plane(origin=(-11.75, -13, 23), x_dir=(0, 1, 0), z_dir=(-1, 0, 0))) as fillet3_piece_23b_section:
        with BuildLine():
            CenterArc((FILLET3_R, FILLET3_R), FILLET3_R, 180, 90)
            Line((0, FILLET3_R), (0, 0))
            Line((0, 0), (FILLET3_R, 0))
        make_face()
    fillet3_piece_23b = extrude(amount=10, mode=Mode.PRIVATE)
    fillet3_piece_23b = split(fillet3_piece_23b, bisect_by=Plane(origin=(-14.25, -12.773604886, 22.773604886), z_dir=(1, 0, 0)), keep=Keep.TOP, mode=Mode.PRIVATE)
    fillet3_piece_23 = fillet3_piece_23a & fillet3_piece_23b
    add(fillet3_piece_23, mode=Mode.SUBTRACT)
    with BuildSketch(Plane(origin=(11.75, -9, 23), x_dir=(0, -1, 0), z_dir=(1, 0, 0))) as fillet3_piece_24a_section:
        with BuildLine():
            CenterArc((FILLET3_R, FILLET3_R), FILLET3_R, 180, 90)
            Line((0, FILLET3_R), (0, 0))
            Line((0, 0), (FILLET3_R, 0))
        make_face()
    fillet3_piece_24a = extrude(amount=10, mode=Mode.PRIVATE)
    fillet3_piece_24a = split(fillet3_piece_24a, bisect_by=Plane(origin=(14.25, -9.226395114, 22.773604886), z_dir=(-1, 0, 0)), keep=Keep.TOP, mode=Mode.PRIVATE)
    with BuildSketch(Plane(origin=(14.25, -11.5, 23), x_dir=(-1, 0, 0), z_dir=(0, 1, 0))) as fillet3_piece_24b_section:
        with BuildLine():
            CenterArc((FILLET3_R, -FILLET3_R), FILLET3_R, 90, 90)
            Line((0, -FILLET3_R), (0, 0))
            Line((0, 0), (FILLET3_R, 0))
        make_face()
    fillet3_piece_24b = extrude(amount=33.5, mode=Mode.PRIVATE)
    fillet3_piece_24b = split(fillet3_piece_24b, bisect_by=Plane(origin=(14.023604886, -9, 22.773604886), z_dir=(0, -1, 0)), keep=Keep.TOP, mode=Mode.PRIVATE)
    fillet3_piece_24 = fillet3_piece_24a & fillet3_piece_24b
    add(fillet3_piece_24, mode=Mode.SUBTRACT)


with BuildPart() as body_2_2:
    # Split2: the piece on the far side of the plane
    add(body_2_1.part)
    split(bisect_by=Plane(origin=(0, -11, 0), x_dir=(0, 0, -1), z_dir=(0, -1, 0)), keep=Keep.BOTTOM)


with BuildPart() as body_2_3:
    add(body_2_1.part)

    # Split2
    split(bisect_by=Plane(origin=(0, -11, 0), x_dir=(0, 0, -1), z_dir=(0, -1, 0)), keep=Keep.TOP)


solid = body_2_3.part
